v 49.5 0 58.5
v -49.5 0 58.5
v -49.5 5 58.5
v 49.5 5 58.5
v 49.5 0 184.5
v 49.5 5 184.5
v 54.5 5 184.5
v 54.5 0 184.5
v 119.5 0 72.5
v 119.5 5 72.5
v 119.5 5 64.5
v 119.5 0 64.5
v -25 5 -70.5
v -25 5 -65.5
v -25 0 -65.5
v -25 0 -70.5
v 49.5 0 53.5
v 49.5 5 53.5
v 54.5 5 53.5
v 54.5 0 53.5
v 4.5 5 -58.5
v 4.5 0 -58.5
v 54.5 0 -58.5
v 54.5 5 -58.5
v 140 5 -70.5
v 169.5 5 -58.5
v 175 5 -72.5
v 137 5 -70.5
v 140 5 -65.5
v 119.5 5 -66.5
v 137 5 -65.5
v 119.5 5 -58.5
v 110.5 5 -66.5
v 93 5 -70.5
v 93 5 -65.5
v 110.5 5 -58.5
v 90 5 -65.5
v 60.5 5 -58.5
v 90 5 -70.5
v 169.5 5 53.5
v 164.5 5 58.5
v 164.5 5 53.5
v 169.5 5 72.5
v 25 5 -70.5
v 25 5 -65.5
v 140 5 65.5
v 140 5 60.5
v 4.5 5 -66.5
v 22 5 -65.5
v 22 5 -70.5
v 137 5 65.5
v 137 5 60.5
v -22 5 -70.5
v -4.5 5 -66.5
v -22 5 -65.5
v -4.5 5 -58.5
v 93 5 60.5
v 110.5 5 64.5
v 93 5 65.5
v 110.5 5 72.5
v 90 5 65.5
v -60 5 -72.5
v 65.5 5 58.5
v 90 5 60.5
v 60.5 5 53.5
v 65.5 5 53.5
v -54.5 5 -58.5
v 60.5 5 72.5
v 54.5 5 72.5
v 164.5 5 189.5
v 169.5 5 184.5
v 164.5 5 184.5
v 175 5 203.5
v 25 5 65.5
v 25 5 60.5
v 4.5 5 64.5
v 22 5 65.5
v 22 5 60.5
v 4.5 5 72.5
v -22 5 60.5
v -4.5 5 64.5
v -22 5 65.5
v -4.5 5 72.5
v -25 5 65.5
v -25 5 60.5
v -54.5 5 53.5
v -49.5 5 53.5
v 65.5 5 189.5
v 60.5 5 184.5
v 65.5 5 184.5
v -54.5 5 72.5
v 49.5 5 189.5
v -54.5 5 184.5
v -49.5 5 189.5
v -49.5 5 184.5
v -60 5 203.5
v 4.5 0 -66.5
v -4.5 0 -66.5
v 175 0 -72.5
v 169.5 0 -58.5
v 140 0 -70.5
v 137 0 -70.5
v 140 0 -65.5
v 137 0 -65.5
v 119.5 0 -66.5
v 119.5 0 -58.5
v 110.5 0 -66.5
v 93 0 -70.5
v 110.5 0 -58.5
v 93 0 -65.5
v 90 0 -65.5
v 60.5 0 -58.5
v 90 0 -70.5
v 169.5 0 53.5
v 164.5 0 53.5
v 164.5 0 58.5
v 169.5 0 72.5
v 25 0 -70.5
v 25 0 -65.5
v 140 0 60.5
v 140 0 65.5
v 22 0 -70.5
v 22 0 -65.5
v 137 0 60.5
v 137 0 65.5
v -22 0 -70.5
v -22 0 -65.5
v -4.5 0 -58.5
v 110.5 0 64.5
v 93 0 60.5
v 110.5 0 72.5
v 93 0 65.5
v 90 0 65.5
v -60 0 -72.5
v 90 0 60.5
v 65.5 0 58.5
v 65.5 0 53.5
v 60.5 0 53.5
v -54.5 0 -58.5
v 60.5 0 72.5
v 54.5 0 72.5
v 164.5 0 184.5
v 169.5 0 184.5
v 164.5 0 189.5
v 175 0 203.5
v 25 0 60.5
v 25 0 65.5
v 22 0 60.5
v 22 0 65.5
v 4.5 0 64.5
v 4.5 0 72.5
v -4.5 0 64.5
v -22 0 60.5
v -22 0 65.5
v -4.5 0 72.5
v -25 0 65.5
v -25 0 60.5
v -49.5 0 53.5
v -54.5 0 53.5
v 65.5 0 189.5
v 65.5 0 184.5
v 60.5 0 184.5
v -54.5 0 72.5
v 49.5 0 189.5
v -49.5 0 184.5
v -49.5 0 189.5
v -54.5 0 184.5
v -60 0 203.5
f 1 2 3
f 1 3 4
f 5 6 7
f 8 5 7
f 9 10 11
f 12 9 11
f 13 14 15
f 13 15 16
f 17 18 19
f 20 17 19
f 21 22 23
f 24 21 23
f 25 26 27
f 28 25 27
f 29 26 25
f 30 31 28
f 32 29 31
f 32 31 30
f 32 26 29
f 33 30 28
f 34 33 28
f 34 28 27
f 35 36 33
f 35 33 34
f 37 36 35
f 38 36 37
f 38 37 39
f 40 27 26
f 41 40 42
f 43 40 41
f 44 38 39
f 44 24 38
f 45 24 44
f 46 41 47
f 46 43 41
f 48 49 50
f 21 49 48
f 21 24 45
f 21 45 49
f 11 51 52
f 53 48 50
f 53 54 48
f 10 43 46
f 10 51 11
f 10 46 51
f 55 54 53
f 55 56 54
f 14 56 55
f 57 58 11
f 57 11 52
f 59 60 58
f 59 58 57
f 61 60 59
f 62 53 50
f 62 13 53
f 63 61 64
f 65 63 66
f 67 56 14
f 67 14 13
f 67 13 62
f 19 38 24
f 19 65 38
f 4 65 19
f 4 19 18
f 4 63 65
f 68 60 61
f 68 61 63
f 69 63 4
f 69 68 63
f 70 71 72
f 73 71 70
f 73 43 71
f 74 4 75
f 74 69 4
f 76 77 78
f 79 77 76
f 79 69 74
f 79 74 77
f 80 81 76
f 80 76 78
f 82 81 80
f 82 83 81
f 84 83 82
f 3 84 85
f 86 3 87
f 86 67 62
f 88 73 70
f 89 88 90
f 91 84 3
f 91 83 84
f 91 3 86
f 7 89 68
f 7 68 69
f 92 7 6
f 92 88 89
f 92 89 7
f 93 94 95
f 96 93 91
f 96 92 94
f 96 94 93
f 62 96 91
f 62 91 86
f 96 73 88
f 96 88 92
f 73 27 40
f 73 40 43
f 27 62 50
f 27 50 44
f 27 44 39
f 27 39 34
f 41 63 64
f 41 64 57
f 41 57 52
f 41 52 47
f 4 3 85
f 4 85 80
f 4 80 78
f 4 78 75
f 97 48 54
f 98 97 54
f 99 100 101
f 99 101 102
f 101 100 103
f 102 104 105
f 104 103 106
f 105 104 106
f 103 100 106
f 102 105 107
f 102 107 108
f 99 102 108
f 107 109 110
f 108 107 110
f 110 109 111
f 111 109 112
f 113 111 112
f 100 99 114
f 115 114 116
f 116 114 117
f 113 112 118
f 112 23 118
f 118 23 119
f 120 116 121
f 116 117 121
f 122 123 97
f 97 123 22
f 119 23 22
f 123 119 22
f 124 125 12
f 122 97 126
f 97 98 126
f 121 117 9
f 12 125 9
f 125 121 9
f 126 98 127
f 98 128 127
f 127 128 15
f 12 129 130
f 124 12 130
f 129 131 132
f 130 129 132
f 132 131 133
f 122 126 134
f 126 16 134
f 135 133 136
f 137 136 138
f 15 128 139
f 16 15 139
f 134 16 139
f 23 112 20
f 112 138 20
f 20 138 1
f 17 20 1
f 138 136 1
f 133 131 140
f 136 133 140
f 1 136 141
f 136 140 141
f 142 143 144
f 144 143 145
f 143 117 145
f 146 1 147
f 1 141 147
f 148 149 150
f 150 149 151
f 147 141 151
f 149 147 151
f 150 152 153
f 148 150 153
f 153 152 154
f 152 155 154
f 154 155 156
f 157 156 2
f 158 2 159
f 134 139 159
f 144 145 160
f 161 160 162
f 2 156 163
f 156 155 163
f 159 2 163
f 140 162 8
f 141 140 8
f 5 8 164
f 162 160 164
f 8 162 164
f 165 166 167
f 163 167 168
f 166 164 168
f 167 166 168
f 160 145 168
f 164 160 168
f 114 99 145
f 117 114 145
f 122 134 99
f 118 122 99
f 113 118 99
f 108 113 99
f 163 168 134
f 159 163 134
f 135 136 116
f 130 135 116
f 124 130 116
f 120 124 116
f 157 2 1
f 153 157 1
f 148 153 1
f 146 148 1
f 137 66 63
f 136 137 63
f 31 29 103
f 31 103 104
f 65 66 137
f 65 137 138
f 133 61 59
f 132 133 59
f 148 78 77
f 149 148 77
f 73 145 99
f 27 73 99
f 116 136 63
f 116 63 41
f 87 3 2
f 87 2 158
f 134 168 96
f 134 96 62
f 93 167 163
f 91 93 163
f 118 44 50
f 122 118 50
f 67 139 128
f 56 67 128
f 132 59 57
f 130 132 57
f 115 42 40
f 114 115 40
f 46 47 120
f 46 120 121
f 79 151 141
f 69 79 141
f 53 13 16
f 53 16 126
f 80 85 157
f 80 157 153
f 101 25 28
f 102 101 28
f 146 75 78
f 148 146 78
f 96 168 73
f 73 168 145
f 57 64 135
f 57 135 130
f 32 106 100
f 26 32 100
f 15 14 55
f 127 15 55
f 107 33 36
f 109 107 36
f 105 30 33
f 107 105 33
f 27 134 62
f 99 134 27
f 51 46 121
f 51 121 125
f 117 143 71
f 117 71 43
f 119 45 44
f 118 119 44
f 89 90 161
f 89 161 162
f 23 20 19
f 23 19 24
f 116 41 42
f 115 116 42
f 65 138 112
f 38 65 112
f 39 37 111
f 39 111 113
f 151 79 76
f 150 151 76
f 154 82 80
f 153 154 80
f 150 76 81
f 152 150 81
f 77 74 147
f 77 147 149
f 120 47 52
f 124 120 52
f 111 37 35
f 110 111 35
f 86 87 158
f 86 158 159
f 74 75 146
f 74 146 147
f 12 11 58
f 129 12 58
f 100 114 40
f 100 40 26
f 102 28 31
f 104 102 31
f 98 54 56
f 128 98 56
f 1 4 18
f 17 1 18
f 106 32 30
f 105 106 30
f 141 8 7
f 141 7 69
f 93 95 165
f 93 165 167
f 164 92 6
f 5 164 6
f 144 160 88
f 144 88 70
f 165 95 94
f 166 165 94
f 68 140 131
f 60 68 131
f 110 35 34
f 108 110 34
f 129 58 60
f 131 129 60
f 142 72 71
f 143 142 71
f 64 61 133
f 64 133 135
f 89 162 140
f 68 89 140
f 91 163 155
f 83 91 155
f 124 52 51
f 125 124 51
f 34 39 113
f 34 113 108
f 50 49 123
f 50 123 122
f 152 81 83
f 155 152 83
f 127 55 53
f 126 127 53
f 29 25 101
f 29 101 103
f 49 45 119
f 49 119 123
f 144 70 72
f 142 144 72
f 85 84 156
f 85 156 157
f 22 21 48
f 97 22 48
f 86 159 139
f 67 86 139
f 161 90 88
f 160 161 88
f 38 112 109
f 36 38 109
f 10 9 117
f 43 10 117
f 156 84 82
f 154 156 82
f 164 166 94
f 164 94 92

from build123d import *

# Parameters (mm, degrees)
SKETCH1_W                 = 120
SKETCH1_H                 = 145
SKETCH1_W_2               = 109
SKETCH1_H_2               = 117
BOSS_EXTRUDE1_DEPTH       = 5
CUT_EXTRUDE1_DEPTH        = 10
SKETCH5_W                 = 3
SKETCH5_H                 = 5
CUT_EXTRUDE4_DEPTH        = 95.240384125
SKETCH6_W                 = 5
SKETCH6_H                 = 5
BOSS_EXTRUDE2_DEPTH       = 5
LPATTERN1_COUNT           = 2
LPATTERN1_PITCH           = 115
LPATTERN1_COUNT_DIR2      = 2
LPATTERN1_PITCH_DIR2      = 131
LPATTERN1_COPY_1_SKETCH_W = 3
LPATTERN1_COPY_1_SKETCH_H = 5
LPATTERN1_COPY_1_DEPTH    = 95.240384125
LPATTERN1_COPY_2_SKETCH_W = 3
LPATTERN1_COPY_2_SKETCH_H = 5
LPATTERN1_COPY_2_DEPTH    = 95.240384125
LPATTERN1_COPY_3_SKETCH_W = 3
LPATTERN1_COPY_3_SKETCH_H = 5
LPATTERN1_COPY_3_DEPTH    = 95.240384125
LPATTERN1_COPY_4_SKETCH_W = 5
LPATTERN1_COPY_4_SKETCH_H = 5
LPATTERN1_COPY_4_DEPTH    = 5
LPATTERN1_COPY_5_SKETCH_W = 5
LPATTERN1_COPY_5_SKETCH_H = 5
LPATTERN1_COPY_5_DEPTH    = 5
LPATTERN1_COPY_6_SKETCH_W = 5
LPATTERN1_COPY_6_SKETCH_H = 5
LPATTERN1_COPY_6_DEPTH    = 5


with BuildPart() as part:
    # Sketch1 → Boss-Extrude1 (new body)
    with BuildSketch(Plane(origin=(0, 0, 0), x_dir=(1, 0, 0), z_dir=(0, 1, 0))):
        Rectangle(SKETCH1_W, SKETCH1_H)
        Rectangle(SKETCH1_W_2, SKETCH1_H_2, mode=Mode.SUBTRACT)
    boss_extrude1 = extrude(amount=BOSS_EXTRUDE1_DEPTH)

    # Sketch2 → Cut-Extrude1 (cut)
    with BuildSketch(Plane(origin=(0, 5, 0), x_dir=(1, 0, 0), z_dir=(0, 1, 0))):
        Polygon((-4.5, 58.5), (0, 58.5), (4.5, 58.5), (4.5, 66.5), (-4.5, 66.5), align=None)
    cut_extrude1 = extrude(amount=-CUT_EXTRUDE1_DEPTH, mode=Mode.SUBTRACT)

    # Sketch5 → Cut-Extrude4 (cut, through all)
    with BuildSketch(Plane(origin=(0, 5, 0), x_dir=(1, 0, 0), z_dir=(0, 1, 0))):
        with Locations((-23.5, 68)):
            Rectangle(SKETCH5_W, SKETCH5_H)
    cut_extrude4 = extrude(amount=-CUT_EXTRUDE4_DEPTH, mode=Mode.SUBTRACT)

    # Mirror1: Cut-Extrude4 across plane
    add(cut_extrude4.mirror(Plane(origin=(0, 0, 0), x_dir=(0, 0, 1), z_dir=(1, 0, 0))), mode=Mode.SUBTRACT)

    # Sketch6 → Boss-Extrude2 (add)
    with BuildSketch(Plane(origin=(0, 5, 0), x_dir=(1, 0, 0), z_dir=(0, 1, 0))):
        with Locations((52, -56)):
            Rectangle(SKETCH6_W, SKETCH6_H)
    boss_extrude2 = extrude(amount=-BOSS_EXTRUDE2_DEPTH)

    # Mirror2: Boss-Extrude2 across plane
    add(boss_extrude2.mirror(Plane(origin=(0, 0, 0), x_dir=(0, 0, 1), z_dir=(1, 0, 0))))

    # LPattern1: Boss-Extrude1, Cut-Extrude1, Cut-Extrude4, Boss-Extrude2 2 × 2
    with Locations(*[(i * LPATTERN1_PITCH, 0, j * LPATTERN1_PITCH_DIR2) for i in range(LPATTERN1_COUNT) for j in range(LPATTERN1_COUNT_DIR2) if (i, j) != (0, 0)]):
        add(boss_extrude1)
        add(cut_extrude1, mode=Mode.SUBTRACT)
        add(cut_extrude4, mode=Mode.SUBTRACT)
        add(boss_extrude2)

    # LPattern1 copy 1 sketch → LPattern1 copy 1 (cut, through all)
    with BuildSketch(Plane(origin=(0, 5, 131), x_dir=(-1, 0, 0), z_dir=(0, 1, 0))):
        with Locations((-23.5, -68)):
            Rectangle(LPATTERN1_COPY_1_SKETCH_W, LPATTERN1_COPY_1_SKETCH_H)
    extrude(amount=-LPATTERN1_COPY_1_DEPTH, mode=Mode.SUBTRACT)

    # LPattern1 copy 2 sketch → LPattern1 copy 2 (cut, through all)
    with BuildSketch(Plane(origin=(115, 5, 0), x_dir=(-1, 0, 0), z_dir=(0, 1, 0))):
        with Locations((-23.5, -68)):
            Rectangle(LPATTERN1_COPY_2_SKETCH_W, LPATTERN1_COPY_2_SKETCH_H)
    extrude(amount=-LPATTERN1_COPY_2_DEPTH, mode=Mode.SUBTRACT)

    # LPattern1 copy 3 sketch → LPattern1 copy 3 (cut, through all)
    with BuildSketch(Plane(origin=(115, 5, 131), x_dir=(-1, 0, 0), z_dir=(0, 1, 0))):
        with Locations((-23.5, -68)):
            Rectangle(LPATTERN1_COPY_3_SKETCH_W, LPATTERN1_COPY_3_SKETCH_H)
    extrude(amount=-LPATTERN1_COPY_3_DEPTH, mode=Mode.SUBTRACT)

    # LPattern1 copy 4 sketch → LPattern1 copy 4 (add)
    with BuildSketch(Plane(origin=(0, 5, 131), x_dir=(-1, 0, 0), z_dir=(0, 1, 0))):
        with Locations((52, 56)):
            Rectangle(LPATTERN1_COPY_4_SKETCH_W, LPATTERN1_COPY_4_SKETCH_H)
    extrude(amount=-LPATTERN1_COPY_4_DEPTH)

    # LPattern1 copy 5 sketch → LPattern1 copy 5 (add)
    with BuildSketch(Plane(origin=(115, 5, 0), x_dir=(-1, 0, 0), z_dir=(0, 1, 0))):
        with Locations((52, 56)):
            Rectangle(LPATTERN1_COPY_5_SKETCH_W, LPATTERN1_COPY_5_SKETCH_H)
    extrude(amount=-LPATTERN1_COPY_5_DEPTH)

    # LPattern1 copy 6 sketch → LPattern1 copy 6 (add)
    with BuildSketch(Plane(origin=(115, 5, 131), x_dir=(-1, 0, 0), z_dir=(0, 1, 0))):
        with Locations((52, 56)):
            Rectangle(LPATTERN1_COPY_6_SKETCH_W, LPATTERN1_COPY_6_SKETCH_H)
    extrude(amount=-LPATTERN1_COPY_6_DEPTH)


solid = part.part
